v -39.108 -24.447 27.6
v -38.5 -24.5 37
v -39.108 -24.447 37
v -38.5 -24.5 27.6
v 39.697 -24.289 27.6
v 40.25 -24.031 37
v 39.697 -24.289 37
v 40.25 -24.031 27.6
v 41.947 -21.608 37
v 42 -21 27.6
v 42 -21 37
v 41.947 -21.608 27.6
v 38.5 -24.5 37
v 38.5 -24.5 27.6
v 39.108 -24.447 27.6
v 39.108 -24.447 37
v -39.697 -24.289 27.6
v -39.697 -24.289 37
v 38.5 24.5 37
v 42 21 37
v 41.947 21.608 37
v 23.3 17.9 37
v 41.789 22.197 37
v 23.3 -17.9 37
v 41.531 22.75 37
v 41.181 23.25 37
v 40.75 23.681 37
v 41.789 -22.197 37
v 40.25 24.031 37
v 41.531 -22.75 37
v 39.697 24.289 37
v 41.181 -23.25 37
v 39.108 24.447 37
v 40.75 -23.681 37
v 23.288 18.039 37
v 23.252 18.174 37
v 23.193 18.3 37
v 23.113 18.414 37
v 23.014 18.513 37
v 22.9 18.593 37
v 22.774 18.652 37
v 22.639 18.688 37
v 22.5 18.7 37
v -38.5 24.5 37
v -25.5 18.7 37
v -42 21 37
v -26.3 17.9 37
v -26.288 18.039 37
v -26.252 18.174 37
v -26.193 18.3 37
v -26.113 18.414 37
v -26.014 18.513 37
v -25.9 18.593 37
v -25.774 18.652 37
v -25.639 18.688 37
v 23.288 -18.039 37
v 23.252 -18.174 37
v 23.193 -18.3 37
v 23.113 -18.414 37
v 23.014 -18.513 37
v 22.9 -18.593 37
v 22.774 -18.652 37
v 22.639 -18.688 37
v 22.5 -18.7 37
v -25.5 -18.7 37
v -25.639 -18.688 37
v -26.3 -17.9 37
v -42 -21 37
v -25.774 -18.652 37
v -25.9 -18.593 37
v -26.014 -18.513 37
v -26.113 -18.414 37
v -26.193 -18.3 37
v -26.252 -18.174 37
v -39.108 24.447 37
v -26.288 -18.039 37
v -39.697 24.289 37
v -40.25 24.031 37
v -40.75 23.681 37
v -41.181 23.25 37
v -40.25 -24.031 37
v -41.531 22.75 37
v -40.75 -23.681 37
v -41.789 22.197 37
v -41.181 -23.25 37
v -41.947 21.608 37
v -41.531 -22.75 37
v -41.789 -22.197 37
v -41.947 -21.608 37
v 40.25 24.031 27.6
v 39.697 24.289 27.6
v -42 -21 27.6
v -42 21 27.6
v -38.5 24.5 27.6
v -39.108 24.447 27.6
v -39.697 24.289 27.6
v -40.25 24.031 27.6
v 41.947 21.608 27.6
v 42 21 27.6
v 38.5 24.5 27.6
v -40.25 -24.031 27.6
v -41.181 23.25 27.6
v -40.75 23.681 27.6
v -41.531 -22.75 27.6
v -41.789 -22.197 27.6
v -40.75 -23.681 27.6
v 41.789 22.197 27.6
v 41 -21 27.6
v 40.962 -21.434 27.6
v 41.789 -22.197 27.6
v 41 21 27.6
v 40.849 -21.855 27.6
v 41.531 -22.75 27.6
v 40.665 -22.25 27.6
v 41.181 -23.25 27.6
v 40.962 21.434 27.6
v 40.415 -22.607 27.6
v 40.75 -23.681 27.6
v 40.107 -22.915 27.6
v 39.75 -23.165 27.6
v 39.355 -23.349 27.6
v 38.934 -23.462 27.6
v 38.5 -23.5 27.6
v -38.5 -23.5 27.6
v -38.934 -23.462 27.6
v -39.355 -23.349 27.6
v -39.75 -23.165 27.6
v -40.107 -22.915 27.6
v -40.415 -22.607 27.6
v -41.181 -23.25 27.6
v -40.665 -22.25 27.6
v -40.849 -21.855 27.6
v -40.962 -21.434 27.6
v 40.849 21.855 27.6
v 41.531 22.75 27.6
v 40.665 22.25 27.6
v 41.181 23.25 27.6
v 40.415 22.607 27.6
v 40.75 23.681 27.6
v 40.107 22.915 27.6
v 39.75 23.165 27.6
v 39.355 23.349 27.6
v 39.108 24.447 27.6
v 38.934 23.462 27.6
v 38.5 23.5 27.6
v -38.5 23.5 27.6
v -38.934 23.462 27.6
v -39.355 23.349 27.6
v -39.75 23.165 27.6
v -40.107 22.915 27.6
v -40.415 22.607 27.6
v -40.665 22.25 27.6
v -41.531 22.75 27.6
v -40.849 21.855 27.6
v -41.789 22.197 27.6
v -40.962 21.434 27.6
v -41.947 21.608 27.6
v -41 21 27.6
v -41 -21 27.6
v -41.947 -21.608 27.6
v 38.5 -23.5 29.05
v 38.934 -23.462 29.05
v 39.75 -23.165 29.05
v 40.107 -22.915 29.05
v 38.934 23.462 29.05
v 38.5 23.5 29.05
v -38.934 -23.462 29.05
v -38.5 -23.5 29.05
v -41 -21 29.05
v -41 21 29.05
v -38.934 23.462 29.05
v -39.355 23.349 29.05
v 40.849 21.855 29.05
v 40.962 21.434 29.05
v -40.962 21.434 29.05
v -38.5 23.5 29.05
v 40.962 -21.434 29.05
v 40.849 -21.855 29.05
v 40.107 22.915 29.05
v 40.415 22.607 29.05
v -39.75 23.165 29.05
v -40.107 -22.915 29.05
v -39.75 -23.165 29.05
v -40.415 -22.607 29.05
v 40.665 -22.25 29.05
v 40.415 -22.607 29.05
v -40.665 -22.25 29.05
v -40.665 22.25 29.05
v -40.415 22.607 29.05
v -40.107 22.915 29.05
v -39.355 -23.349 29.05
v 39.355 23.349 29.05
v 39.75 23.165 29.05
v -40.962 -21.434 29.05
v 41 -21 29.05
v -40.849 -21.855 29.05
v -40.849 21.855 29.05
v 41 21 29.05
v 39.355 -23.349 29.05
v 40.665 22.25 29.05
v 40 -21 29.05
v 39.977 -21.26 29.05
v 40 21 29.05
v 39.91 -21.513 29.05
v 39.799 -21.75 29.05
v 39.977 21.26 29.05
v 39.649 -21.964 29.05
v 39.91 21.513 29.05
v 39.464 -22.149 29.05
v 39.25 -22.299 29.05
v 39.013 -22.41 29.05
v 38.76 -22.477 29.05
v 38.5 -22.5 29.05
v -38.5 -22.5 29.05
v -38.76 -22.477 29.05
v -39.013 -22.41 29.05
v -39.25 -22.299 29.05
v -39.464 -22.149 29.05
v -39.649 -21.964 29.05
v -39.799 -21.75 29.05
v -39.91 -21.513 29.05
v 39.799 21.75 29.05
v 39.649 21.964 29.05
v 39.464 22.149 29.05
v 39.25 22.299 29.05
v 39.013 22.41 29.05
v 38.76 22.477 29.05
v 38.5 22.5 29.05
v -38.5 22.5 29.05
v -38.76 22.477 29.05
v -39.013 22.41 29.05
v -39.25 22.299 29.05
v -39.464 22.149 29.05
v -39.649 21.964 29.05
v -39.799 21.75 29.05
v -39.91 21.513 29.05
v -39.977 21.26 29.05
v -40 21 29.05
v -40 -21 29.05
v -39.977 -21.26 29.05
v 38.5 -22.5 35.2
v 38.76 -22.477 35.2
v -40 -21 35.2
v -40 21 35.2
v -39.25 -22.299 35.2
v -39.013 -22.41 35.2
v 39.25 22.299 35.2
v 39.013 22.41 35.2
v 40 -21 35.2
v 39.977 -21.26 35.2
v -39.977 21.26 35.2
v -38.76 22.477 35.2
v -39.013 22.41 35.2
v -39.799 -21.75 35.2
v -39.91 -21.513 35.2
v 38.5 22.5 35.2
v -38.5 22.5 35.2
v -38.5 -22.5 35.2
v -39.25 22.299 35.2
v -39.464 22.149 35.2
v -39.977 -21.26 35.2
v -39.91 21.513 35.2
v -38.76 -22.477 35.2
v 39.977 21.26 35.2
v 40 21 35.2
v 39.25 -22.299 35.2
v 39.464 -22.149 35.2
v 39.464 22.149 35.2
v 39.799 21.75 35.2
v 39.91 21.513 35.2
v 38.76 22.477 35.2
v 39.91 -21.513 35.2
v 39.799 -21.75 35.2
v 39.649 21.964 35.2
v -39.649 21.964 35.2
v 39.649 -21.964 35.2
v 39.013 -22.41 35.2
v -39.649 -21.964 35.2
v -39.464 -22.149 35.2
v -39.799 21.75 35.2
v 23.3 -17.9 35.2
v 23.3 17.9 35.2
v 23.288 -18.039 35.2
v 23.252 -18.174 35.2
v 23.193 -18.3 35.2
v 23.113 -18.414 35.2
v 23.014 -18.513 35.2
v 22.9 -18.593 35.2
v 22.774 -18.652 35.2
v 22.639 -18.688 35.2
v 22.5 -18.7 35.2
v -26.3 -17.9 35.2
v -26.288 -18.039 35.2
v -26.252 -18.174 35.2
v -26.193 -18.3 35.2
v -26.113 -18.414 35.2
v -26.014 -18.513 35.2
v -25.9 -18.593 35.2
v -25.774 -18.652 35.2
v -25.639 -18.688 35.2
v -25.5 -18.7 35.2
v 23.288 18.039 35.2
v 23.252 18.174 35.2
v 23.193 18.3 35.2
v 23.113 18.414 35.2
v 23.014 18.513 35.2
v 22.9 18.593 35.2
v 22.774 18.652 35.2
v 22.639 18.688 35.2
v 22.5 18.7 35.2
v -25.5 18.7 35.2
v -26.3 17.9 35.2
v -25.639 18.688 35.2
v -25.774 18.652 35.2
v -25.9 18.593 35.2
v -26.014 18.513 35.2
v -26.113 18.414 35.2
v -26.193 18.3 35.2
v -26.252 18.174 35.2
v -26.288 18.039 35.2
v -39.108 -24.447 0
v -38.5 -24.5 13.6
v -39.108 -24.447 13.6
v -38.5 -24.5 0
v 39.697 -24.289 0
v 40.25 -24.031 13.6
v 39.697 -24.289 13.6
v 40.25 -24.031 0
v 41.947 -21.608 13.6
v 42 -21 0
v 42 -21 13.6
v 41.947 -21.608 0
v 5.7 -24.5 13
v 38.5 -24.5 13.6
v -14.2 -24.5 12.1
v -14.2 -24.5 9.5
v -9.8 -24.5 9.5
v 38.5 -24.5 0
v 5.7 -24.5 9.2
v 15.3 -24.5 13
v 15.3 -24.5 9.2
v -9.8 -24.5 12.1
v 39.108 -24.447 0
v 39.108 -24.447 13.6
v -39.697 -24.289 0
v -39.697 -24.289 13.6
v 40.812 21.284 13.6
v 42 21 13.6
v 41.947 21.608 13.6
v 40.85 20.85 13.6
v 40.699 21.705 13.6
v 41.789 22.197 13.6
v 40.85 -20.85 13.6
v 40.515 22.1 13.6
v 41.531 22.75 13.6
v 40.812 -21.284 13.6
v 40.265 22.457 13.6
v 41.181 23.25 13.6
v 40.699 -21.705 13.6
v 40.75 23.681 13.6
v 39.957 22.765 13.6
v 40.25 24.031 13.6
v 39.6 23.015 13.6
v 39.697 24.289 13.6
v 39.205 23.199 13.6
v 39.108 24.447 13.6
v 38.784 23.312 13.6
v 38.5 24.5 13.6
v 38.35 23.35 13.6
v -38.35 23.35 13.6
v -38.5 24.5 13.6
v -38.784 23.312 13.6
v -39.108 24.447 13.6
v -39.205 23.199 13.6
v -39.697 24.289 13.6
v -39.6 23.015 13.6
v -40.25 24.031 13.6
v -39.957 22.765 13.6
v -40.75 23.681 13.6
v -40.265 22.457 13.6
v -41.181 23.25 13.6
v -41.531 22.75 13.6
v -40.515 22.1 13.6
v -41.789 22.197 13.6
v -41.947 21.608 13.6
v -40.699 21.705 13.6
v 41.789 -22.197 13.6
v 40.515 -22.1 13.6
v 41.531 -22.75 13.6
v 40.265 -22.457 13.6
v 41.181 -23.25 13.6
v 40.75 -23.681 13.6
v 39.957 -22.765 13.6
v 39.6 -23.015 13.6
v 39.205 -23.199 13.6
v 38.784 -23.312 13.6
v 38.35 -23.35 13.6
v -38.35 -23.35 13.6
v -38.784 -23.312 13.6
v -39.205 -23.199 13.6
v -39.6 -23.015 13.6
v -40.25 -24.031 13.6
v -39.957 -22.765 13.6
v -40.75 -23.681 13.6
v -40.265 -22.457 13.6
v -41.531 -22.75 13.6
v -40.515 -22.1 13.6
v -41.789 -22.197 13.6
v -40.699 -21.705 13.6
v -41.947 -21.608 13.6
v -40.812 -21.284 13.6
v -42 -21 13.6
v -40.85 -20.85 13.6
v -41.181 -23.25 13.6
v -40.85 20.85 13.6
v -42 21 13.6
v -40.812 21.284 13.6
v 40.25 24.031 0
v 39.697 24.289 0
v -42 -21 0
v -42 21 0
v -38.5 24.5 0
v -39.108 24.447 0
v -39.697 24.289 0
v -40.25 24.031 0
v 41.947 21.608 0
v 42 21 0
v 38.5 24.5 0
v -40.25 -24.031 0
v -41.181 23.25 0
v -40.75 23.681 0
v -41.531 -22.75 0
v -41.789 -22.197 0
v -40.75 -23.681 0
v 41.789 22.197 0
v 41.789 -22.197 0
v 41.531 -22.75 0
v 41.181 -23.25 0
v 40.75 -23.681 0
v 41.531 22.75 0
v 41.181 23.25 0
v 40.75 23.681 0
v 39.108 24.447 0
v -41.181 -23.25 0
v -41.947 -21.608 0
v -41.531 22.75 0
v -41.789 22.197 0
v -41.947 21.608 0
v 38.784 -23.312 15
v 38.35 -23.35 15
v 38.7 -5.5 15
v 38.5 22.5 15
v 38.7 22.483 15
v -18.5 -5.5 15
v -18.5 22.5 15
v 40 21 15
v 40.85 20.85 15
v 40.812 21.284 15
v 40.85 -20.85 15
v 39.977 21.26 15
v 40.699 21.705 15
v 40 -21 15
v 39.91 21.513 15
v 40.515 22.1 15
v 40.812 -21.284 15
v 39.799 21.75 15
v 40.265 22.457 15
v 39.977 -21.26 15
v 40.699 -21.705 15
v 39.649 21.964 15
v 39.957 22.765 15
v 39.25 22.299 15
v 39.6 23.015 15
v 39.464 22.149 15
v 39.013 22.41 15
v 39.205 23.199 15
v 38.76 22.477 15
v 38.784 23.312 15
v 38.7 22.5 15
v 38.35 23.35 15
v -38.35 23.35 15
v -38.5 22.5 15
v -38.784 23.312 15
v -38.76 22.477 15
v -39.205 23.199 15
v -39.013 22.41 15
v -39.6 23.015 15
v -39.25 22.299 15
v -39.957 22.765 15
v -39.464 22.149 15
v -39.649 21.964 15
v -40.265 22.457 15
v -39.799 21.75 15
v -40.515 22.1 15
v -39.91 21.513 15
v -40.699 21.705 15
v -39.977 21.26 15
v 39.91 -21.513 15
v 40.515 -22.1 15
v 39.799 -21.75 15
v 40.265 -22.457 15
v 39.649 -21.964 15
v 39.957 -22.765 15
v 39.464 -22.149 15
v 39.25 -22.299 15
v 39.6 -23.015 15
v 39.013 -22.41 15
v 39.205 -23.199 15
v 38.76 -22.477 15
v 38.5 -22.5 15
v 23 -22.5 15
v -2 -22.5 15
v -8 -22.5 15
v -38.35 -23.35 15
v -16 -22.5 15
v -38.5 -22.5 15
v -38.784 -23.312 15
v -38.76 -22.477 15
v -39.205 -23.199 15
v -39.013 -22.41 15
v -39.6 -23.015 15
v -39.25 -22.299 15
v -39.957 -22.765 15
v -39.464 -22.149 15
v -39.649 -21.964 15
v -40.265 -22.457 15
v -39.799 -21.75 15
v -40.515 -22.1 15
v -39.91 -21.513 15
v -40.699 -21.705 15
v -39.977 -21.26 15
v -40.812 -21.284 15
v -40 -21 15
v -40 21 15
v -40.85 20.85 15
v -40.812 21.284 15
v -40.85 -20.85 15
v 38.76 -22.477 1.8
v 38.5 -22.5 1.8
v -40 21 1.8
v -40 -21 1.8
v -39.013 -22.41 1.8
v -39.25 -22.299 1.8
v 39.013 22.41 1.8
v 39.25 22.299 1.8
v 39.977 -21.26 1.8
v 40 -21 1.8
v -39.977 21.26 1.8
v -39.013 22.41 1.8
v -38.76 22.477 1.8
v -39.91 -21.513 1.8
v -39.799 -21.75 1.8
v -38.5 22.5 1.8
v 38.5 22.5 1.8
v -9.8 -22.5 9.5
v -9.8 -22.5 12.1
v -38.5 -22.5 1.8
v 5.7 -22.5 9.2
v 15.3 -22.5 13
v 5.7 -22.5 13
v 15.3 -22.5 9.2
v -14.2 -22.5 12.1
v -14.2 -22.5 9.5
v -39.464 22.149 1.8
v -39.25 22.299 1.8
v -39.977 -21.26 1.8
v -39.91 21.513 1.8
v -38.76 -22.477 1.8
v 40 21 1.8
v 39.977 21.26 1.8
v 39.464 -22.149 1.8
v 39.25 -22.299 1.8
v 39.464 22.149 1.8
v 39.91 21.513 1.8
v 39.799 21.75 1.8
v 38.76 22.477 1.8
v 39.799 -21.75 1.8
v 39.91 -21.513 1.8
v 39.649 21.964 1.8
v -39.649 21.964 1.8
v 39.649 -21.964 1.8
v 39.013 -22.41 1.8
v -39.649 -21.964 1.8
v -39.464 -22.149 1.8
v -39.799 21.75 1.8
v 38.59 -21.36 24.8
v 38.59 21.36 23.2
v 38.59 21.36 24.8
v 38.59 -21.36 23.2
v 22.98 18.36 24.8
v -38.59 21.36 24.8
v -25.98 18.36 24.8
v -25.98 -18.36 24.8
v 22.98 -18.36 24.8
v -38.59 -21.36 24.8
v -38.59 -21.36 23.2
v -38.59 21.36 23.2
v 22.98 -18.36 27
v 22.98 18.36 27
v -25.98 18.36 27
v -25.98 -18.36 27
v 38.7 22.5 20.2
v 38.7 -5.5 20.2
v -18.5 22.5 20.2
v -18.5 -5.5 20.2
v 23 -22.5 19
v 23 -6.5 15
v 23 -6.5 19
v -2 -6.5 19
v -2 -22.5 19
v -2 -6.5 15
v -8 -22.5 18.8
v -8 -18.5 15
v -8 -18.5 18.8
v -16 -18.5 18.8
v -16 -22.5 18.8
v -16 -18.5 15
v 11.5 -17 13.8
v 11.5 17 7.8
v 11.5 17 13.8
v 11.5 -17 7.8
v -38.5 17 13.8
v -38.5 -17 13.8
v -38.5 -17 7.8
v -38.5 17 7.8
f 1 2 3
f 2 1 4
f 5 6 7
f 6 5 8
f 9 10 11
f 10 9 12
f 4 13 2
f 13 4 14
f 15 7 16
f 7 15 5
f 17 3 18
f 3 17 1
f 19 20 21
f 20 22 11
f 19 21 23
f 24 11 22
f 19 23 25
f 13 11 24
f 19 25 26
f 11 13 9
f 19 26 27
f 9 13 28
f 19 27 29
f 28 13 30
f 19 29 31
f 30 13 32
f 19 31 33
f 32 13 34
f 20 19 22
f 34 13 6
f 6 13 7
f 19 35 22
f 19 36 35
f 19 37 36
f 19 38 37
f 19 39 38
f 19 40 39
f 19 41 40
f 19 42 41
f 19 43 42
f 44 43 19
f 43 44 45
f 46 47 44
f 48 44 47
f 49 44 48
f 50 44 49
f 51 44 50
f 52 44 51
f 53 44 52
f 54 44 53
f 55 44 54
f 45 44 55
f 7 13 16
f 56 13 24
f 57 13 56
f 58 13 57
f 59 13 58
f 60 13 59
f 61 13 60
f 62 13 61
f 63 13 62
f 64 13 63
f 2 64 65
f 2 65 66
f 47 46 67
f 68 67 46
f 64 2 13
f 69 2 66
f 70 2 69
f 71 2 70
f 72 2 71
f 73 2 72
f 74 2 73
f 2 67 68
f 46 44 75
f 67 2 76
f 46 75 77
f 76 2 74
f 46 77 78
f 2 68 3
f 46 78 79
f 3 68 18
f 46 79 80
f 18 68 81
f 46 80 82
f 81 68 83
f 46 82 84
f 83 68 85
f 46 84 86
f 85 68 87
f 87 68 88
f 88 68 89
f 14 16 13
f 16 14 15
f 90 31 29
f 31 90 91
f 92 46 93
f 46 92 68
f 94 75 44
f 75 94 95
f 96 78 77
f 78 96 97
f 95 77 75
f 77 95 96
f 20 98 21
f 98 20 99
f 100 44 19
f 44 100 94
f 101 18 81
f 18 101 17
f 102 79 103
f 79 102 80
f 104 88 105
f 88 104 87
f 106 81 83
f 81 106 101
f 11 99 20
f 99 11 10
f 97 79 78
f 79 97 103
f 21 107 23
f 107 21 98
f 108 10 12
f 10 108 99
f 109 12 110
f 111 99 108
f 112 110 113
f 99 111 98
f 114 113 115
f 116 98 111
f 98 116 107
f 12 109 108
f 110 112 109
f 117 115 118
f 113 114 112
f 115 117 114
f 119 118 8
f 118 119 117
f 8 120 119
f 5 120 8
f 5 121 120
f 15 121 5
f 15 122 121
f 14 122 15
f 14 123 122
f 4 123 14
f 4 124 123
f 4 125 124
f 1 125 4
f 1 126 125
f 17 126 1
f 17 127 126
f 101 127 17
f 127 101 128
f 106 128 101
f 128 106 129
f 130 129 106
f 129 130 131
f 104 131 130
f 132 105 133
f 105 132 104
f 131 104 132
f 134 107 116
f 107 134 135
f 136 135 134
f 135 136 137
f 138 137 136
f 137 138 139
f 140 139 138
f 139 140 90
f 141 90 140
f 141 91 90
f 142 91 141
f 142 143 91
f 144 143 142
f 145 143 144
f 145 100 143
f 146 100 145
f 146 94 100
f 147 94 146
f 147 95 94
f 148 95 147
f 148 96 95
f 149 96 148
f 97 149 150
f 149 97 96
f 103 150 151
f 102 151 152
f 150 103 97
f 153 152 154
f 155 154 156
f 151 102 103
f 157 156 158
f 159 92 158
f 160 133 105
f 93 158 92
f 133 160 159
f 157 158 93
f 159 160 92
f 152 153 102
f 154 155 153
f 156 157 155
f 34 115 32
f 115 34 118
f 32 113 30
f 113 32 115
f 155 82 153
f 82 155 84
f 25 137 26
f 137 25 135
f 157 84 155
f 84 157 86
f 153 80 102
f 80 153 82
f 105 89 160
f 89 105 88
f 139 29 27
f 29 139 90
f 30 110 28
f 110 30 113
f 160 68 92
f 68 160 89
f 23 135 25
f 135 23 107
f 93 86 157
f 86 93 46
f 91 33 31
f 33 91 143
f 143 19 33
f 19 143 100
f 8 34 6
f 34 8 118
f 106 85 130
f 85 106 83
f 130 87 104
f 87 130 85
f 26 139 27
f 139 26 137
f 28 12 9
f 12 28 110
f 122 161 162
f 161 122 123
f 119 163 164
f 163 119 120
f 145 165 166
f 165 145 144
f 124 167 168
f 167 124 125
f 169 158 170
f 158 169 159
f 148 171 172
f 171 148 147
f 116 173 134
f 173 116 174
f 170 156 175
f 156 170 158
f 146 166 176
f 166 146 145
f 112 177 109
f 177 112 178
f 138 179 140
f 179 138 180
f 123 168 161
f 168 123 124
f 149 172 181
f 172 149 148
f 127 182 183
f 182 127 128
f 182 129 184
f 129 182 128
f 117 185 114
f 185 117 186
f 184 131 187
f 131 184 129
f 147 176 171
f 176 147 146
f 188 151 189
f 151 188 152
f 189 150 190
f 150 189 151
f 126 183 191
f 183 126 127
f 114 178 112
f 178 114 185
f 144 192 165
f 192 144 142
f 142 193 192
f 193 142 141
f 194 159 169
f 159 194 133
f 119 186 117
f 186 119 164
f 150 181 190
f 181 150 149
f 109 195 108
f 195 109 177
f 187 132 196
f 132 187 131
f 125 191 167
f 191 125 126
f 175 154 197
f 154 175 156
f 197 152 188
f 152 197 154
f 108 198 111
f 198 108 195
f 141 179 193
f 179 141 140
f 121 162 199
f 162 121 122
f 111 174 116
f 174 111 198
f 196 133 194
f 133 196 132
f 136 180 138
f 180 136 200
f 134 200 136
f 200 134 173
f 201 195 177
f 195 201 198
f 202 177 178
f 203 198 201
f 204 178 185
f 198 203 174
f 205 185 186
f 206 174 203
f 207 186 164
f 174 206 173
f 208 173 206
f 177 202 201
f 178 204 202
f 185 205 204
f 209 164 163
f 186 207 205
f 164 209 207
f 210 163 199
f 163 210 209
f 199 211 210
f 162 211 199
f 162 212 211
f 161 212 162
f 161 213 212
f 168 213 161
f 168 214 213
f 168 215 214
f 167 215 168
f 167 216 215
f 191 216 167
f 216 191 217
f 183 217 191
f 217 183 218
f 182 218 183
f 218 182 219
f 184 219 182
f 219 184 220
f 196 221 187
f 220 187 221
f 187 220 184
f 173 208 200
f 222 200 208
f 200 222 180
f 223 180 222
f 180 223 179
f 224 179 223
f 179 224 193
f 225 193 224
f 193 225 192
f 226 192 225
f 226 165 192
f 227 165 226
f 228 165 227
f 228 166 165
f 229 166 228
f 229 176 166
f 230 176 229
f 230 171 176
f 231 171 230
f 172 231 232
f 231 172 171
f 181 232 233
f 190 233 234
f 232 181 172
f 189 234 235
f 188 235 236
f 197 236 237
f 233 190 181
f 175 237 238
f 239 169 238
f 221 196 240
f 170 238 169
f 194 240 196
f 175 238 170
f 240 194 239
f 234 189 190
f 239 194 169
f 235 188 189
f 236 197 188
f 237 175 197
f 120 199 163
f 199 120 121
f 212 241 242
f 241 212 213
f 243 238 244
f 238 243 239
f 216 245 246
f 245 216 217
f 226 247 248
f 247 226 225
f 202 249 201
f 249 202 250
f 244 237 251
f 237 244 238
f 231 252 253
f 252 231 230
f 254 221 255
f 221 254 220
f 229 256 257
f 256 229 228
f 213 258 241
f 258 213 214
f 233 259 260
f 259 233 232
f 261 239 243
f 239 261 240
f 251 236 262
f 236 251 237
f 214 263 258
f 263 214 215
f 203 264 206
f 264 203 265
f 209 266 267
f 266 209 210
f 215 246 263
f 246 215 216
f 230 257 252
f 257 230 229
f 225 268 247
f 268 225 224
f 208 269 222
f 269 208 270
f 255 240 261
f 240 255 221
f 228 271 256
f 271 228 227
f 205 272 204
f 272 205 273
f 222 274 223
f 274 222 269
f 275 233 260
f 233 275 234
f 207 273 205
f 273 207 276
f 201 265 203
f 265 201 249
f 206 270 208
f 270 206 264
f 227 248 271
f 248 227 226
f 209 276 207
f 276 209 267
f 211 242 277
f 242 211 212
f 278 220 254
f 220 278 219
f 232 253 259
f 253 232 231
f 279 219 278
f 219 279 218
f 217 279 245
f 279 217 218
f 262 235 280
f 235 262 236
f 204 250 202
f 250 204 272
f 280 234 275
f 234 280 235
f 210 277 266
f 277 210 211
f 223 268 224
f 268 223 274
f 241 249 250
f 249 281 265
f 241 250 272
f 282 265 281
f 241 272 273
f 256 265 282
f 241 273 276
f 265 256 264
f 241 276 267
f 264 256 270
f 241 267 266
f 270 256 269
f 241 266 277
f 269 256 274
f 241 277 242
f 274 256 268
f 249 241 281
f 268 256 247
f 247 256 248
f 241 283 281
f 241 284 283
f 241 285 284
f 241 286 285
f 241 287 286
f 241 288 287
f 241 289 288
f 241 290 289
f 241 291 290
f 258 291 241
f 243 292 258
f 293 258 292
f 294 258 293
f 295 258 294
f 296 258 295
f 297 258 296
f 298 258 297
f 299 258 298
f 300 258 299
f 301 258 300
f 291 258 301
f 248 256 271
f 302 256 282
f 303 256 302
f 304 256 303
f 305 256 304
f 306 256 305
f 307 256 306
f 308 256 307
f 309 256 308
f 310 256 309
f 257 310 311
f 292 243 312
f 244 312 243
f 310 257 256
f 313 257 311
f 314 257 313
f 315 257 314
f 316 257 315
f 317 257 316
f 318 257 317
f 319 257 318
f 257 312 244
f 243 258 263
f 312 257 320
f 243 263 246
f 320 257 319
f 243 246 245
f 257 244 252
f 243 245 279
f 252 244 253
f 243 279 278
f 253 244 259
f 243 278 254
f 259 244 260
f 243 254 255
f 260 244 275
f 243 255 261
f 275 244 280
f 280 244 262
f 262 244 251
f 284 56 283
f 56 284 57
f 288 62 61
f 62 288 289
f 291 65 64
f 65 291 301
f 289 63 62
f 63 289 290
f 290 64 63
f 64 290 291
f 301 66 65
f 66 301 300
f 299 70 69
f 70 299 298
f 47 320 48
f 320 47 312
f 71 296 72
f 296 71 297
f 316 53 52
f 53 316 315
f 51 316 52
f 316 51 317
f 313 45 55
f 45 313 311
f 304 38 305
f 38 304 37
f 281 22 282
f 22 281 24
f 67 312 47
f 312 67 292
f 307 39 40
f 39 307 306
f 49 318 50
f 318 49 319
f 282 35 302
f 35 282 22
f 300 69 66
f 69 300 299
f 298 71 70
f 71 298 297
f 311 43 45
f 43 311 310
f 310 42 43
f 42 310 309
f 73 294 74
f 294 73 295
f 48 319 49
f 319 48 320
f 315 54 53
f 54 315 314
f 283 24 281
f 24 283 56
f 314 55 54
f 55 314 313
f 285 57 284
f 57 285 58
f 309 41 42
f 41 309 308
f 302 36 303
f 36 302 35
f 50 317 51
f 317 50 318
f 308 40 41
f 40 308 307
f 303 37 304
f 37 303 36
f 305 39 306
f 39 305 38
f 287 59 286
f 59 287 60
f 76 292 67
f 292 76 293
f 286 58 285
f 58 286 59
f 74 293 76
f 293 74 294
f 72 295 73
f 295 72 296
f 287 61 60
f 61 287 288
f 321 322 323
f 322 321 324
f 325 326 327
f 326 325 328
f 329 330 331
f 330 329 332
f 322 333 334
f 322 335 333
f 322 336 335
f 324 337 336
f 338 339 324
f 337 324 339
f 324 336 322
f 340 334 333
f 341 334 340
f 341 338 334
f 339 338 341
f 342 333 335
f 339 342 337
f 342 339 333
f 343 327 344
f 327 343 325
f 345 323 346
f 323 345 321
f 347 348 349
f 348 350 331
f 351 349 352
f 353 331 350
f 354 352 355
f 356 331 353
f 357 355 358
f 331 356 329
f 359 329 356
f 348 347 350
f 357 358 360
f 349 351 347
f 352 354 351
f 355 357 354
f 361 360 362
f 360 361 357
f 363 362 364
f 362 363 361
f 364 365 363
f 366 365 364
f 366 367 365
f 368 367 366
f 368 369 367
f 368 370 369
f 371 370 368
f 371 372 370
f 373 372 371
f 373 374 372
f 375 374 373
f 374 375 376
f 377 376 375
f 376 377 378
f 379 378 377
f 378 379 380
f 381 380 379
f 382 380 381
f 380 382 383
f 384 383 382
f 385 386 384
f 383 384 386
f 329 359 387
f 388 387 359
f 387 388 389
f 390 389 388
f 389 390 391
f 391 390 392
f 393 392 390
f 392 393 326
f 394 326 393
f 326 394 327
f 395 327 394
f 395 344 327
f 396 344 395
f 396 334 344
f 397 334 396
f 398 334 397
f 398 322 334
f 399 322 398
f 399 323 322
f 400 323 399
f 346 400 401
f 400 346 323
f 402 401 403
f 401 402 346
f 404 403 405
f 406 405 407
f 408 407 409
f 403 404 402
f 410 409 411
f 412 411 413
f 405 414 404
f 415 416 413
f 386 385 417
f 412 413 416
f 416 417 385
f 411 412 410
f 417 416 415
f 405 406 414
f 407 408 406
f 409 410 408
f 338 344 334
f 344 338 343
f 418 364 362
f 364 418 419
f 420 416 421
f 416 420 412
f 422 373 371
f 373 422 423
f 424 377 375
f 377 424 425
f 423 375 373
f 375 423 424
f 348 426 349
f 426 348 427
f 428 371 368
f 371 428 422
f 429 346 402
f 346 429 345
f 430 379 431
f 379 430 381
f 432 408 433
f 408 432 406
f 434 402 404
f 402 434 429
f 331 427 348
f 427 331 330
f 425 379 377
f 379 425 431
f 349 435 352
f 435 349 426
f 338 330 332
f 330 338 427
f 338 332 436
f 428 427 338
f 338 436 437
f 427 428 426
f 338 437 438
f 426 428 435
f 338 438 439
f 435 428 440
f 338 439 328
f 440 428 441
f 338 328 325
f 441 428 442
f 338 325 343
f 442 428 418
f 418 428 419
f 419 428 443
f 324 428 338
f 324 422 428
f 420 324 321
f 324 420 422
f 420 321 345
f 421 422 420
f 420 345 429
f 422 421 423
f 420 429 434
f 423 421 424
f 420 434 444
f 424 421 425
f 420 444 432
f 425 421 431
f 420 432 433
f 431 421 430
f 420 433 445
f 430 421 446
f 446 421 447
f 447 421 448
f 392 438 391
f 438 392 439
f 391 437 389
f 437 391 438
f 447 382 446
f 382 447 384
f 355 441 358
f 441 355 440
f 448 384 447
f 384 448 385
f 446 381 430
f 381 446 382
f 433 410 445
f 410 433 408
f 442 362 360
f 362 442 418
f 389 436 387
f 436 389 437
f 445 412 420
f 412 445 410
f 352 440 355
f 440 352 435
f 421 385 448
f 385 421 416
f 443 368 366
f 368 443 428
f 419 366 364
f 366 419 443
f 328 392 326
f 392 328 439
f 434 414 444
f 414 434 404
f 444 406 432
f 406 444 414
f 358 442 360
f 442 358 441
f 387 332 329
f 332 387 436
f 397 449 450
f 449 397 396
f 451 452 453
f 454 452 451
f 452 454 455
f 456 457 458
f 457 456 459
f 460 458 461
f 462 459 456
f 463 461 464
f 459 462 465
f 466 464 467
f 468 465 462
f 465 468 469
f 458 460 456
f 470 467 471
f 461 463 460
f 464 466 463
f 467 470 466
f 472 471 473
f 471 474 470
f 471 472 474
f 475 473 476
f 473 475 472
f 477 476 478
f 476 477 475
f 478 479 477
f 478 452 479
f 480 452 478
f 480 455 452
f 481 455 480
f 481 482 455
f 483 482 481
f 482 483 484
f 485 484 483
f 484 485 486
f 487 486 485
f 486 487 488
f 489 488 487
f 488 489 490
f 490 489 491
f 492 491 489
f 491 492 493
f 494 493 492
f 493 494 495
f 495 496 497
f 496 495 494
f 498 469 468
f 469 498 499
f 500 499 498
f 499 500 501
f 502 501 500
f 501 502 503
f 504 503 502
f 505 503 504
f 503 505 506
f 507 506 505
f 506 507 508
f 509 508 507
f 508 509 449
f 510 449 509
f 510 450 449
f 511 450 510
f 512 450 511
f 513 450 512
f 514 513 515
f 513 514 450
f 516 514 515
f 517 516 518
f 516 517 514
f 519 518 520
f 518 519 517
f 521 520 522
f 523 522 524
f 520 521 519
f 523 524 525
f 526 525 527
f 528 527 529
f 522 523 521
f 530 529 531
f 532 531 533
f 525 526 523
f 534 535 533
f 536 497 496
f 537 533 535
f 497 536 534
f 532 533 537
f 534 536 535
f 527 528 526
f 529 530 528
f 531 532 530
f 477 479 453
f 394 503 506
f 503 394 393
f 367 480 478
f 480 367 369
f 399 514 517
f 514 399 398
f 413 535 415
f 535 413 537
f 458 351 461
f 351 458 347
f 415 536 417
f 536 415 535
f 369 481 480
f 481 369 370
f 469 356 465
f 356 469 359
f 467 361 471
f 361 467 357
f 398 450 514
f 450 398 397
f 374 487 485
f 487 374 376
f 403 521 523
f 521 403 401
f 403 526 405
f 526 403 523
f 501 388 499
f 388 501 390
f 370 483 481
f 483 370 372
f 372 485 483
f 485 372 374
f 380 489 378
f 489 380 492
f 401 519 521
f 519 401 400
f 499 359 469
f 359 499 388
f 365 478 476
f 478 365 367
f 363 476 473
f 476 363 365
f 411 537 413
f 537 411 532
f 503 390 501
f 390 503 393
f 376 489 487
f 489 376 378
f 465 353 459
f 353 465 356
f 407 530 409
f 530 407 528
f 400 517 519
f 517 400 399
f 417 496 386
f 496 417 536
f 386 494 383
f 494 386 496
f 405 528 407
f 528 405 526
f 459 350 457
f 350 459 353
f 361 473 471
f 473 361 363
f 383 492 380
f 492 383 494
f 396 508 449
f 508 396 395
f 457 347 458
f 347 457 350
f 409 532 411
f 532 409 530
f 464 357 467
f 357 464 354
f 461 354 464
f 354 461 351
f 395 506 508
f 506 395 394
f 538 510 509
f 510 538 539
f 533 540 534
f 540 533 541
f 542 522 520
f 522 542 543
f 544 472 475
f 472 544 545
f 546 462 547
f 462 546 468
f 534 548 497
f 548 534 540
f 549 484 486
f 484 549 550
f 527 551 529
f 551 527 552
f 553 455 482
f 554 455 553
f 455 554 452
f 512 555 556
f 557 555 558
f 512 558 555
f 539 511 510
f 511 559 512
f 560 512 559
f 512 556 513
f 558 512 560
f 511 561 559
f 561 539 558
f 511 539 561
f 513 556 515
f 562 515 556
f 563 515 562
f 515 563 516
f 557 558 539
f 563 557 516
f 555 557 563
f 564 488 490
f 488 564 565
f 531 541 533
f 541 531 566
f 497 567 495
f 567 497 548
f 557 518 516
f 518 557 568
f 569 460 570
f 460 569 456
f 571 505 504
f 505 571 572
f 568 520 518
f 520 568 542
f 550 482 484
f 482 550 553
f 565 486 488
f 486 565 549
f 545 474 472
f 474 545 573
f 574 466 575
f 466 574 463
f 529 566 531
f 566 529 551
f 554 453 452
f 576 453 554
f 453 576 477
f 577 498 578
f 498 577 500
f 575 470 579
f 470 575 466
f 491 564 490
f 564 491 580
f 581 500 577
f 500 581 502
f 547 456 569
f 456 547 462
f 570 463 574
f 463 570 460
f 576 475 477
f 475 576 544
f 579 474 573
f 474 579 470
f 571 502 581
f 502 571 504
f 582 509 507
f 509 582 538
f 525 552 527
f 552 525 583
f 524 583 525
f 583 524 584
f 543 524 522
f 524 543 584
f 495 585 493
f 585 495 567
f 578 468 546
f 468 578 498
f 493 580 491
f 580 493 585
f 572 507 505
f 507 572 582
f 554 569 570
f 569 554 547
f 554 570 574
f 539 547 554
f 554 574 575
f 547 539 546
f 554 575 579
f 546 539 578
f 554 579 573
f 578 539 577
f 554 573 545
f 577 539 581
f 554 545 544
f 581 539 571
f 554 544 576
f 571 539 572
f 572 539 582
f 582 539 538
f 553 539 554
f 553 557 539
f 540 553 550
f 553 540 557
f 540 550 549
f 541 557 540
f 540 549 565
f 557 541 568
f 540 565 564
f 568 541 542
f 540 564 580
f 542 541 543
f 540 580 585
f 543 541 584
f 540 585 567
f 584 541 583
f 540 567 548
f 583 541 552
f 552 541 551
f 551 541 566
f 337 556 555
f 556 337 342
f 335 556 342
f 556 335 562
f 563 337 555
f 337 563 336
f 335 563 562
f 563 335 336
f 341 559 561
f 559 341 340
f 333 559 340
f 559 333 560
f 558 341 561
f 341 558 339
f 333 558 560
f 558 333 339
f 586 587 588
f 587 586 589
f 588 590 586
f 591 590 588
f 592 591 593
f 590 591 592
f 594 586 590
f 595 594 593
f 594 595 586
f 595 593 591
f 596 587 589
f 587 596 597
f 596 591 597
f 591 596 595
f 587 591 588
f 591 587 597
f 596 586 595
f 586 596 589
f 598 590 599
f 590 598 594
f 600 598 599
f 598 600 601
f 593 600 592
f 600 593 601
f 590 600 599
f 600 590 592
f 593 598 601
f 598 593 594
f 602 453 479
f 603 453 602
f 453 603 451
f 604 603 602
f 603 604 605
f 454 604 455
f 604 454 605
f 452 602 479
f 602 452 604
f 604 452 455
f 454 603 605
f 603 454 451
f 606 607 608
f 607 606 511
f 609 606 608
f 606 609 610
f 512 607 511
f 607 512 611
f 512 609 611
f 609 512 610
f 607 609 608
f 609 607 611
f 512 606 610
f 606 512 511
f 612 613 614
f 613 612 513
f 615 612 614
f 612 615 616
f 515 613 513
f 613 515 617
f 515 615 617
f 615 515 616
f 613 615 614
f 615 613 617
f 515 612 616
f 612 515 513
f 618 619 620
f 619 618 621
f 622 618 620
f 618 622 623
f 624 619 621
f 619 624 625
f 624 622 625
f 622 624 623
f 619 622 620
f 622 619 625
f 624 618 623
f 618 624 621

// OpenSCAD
// =========================================================================
// Parametric 3D Enclosure for ESP32-S3 N16R8 + 2.4" TFT Touch SPI + Charger
// Units: millimeters (mm). Measure your clone PCB with calipers before printing!
// =========================================================================

// Choose part to export: "assembled", "exploded", "top", "bottom"
PART_MODE = "exploded"; // ["assembled", "exploded", "top", "bottom"]
// Battery configuration: "603450" (84x49x23mm) or "180mah" (84x49x17mm)
BATTERY_MODE = "603450"; // ["603450", "180mah"]

// --- Outer Shell Parameters ---
outer_w = 84.0;
outer_h = 49.0;
wall    = 2.0;
floor_t = 1.8;
bezel_t = 1.8;
corner_r = 3.5;

total_z = (BATTERY_MODE == "603450") ? 23.0 : 17.0;
split_z = total_z - 8.0; // Top bezel shell stays 8.0mm tall (+1.4mm snap groove)
snap_h  = 1.4;
tol     = 0.15;

// --- 2.4" TFT (MSP2402 / TJCTM24024-SPI) Parameters ---
tft_pcb_w = 77.18;
tft_pcb_h = 42.72;
win_w     = 49.6;   // Active area 48.96 + 0.64 clearance
win_h     = 37.4;   // Active area 36.72 + 0.68 clearance
win_cx    = -1.5;   // Asymmetric offset matching PCB header/SD margins

// --- Bottom Edge Cutouts (Y = -outer_h/2) ---
sw_w   = 4.4;   sw_h   = 2.6;  sw_cx   = -12.0; // SS-12D00 toggle slot
usbc_w = 9.6;   usbc_h = 3.8;  usbc_cx =  10.5; // MH-CD42 / LX-LCBST Type-C port

$fn = 36;

module rrect_extrude(w, h, r, z0, height) {
    translate([0, 0, z0])
    linear_extrude(height = height)
        offset(r = r)
            square([w - 2*r, h - 2*r], center = true);
}

module top_bezel_shell() {
    difference() {
        union() {
            rrect_extrude(outer_w, outer_h, corner_r, split_z - snap_h, 8.0 + snap_h);
        }
        // Hollow interior + snap groove matching bottom shell tongue
        rrect_extrude(outer_w - wall, outer_h - wall, max(0.5, corner_r - wall*0.5),
                      split_z - snap_h - 0.1, snap_h + 0.15);
        rrect_extrude(outer_w - 2*wall, outer_h - 2*wall, max(0.5, corner_r - wall),
                      split_z - 0.05, 8.0 - bezel_t + 0.05);
        // Active screen window cutout
        translate([win_cx, 0, total_z - bezel_t - 0.2])
            rrect_extrude(win_w, win_h, 0.8, 0, bezel_t + 0.5);
    }
}

module bottom_shell() {
    port_base_z = (BATTERY_MODE == "603450") ? 9.2 : 2.2;
    difference() {
        union() {
            rrect_extrude(outer_w, outer_h, corner_r, 0, split_z - snap_h);
            // Snap-fit tongue rim
            rrect_extrude(outer_w - wall - 2*tol, outer_h - wall - 2*tol,
                          max(0.5, corner_r - wall*0.5), split_z - snap_h, snap_h);
        }
        // Inner electronics cavity
        rrect_extrude(outer_w - 2*wall, outer_h - 2*wall, max(0.5, corner_r - wall),
                      floor_t, split_z + 0.2);
        // SS-12D00 mini slide switch slot on bottom edge
        translate([sw_cx, -outer_h/2 + wall/2, port_base_z + 0.3 + sw_h/2])
            cube([sw_w, wall + 1.0, sw_h], center = true);
        // USB Type-C charging cutout on bottom edge
        translate([usbc_cx, -outer_h/2 + wall/2, port_base_z + usbc_h/2])
            cube([usbc_w, wall + 1.0, usbc_h], center = true);
    }
}

module internal_components_preview() {
    // 1. 2.4" TFT Screen PCB (Red)
    color("crimson") translate([0, 0, split_z + 3.0])
        cube([tft_pcb_w, tft_pcb_h, 1.6], center = true);
    color("black") translate([win_cx, 0, split_z + 4.9])
        cube([48.96, 36.72, 2.2], center = true);
    // 2. ESP32-S3 N16R8 (Antenna at +X clear of battery)
    esp_z = (BATTERY_MODE == "603450") ? 9.0 : 1.8;
    color("dimgray") translate([10.1, 8.5, esp_z + 2.6])
        cube([57.2, 28.0, 5.2], center = true);
    // 3. MH-CD42 / LX-LCBST Charger + SS-12D00 Switch
    color("teal") translate([usbc_cx, -14.5, esp_z + 2.0])
        cube([25.0, 16.0, 4.0], center = true);
    color("gold") translate([sw_cx, -20.5, esp_z + 1.9])
        cube([8.0, 4.0, 3.8], center = true);
    // 4. LiPo Battery
    if (BATTERY_MODE == "603450") {
        color("silver") translate([-13.5, 0, 1.8 + 3.0])
            cube([50.0, 34.0, 6.0], center = true);
    } else {
        color("silver") translate([-29.5, 7.5, 1.8 + 2.0])
            cube([20.0, 30.0, 4.0], center = true);
    }
}

if (PART_MODE == "top") {
    rotate([180, 0, 0]) translate([0, 0, -total_z]) top_bezel_shell();
} else if (PART_MODE == "bottom") {
    bottom_shell();
} else if (PART_MODE == "assembled") {
    color("steelblue", 0.35) top_bezel_shell();
    color("slategray", 0.35) bottom_shell();
    internal_components_preview();
} else {
    translate([0, 0, 14]) color("steelblue", 0.4) top_bezel_shell();
    color("slategray", 0.4) bottom_shell();
    translate([0, 0, 6]) internal_components_preview();
}
